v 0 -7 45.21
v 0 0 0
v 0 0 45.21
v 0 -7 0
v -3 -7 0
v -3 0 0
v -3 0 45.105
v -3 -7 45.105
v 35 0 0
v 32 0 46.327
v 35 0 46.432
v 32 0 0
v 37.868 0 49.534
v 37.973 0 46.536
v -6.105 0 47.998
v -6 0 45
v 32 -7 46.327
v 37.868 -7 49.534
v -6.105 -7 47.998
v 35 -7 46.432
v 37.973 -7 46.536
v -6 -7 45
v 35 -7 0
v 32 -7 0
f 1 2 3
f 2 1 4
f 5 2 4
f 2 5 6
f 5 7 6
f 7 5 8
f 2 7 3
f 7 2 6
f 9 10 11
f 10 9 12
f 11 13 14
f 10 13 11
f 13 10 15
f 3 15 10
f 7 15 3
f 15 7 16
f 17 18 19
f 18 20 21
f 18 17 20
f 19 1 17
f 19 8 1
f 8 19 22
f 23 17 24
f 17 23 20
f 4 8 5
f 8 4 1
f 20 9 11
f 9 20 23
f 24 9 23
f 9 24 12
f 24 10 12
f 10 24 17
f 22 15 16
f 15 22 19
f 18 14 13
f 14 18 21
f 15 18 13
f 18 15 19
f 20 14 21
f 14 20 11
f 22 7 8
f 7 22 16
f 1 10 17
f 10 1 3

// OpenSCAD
/* dooropening.scad
 *
 * Copyright (C) Robert B. Ross, 2016
 *
 * This software is released under the Creative Commons
 * Attribution-ShareAlike 4.0 International Public License.
 */

doorOpening();

/* doorOpening() -- create an opening where a door would go.
 *
 * cutout -- rather than creating the door with frame, creates a hull that
 *           can be used to diff out of a wall.
 *
 * NOTE: Positioned so that left back bottom corner of opening is at origin
 */
module doorOpening(width=32, height=45, thick=7, angle=2, cutout=0) {
   slop = 2;

   if (cutout) {
      translate([0,-thick,-0.1]) cube([width,thick+1,height+slop]);
   }
   else {
      translate([-3,-thick,0]) cube([3, thick, height+slop]);
      translate([width,-thick,0]) cube([3, thick, height+slop]);

      translate([-6,-thick,height]) rotate([0,-angle,0])
         cube([width+12,thick,3]);
   }
}
